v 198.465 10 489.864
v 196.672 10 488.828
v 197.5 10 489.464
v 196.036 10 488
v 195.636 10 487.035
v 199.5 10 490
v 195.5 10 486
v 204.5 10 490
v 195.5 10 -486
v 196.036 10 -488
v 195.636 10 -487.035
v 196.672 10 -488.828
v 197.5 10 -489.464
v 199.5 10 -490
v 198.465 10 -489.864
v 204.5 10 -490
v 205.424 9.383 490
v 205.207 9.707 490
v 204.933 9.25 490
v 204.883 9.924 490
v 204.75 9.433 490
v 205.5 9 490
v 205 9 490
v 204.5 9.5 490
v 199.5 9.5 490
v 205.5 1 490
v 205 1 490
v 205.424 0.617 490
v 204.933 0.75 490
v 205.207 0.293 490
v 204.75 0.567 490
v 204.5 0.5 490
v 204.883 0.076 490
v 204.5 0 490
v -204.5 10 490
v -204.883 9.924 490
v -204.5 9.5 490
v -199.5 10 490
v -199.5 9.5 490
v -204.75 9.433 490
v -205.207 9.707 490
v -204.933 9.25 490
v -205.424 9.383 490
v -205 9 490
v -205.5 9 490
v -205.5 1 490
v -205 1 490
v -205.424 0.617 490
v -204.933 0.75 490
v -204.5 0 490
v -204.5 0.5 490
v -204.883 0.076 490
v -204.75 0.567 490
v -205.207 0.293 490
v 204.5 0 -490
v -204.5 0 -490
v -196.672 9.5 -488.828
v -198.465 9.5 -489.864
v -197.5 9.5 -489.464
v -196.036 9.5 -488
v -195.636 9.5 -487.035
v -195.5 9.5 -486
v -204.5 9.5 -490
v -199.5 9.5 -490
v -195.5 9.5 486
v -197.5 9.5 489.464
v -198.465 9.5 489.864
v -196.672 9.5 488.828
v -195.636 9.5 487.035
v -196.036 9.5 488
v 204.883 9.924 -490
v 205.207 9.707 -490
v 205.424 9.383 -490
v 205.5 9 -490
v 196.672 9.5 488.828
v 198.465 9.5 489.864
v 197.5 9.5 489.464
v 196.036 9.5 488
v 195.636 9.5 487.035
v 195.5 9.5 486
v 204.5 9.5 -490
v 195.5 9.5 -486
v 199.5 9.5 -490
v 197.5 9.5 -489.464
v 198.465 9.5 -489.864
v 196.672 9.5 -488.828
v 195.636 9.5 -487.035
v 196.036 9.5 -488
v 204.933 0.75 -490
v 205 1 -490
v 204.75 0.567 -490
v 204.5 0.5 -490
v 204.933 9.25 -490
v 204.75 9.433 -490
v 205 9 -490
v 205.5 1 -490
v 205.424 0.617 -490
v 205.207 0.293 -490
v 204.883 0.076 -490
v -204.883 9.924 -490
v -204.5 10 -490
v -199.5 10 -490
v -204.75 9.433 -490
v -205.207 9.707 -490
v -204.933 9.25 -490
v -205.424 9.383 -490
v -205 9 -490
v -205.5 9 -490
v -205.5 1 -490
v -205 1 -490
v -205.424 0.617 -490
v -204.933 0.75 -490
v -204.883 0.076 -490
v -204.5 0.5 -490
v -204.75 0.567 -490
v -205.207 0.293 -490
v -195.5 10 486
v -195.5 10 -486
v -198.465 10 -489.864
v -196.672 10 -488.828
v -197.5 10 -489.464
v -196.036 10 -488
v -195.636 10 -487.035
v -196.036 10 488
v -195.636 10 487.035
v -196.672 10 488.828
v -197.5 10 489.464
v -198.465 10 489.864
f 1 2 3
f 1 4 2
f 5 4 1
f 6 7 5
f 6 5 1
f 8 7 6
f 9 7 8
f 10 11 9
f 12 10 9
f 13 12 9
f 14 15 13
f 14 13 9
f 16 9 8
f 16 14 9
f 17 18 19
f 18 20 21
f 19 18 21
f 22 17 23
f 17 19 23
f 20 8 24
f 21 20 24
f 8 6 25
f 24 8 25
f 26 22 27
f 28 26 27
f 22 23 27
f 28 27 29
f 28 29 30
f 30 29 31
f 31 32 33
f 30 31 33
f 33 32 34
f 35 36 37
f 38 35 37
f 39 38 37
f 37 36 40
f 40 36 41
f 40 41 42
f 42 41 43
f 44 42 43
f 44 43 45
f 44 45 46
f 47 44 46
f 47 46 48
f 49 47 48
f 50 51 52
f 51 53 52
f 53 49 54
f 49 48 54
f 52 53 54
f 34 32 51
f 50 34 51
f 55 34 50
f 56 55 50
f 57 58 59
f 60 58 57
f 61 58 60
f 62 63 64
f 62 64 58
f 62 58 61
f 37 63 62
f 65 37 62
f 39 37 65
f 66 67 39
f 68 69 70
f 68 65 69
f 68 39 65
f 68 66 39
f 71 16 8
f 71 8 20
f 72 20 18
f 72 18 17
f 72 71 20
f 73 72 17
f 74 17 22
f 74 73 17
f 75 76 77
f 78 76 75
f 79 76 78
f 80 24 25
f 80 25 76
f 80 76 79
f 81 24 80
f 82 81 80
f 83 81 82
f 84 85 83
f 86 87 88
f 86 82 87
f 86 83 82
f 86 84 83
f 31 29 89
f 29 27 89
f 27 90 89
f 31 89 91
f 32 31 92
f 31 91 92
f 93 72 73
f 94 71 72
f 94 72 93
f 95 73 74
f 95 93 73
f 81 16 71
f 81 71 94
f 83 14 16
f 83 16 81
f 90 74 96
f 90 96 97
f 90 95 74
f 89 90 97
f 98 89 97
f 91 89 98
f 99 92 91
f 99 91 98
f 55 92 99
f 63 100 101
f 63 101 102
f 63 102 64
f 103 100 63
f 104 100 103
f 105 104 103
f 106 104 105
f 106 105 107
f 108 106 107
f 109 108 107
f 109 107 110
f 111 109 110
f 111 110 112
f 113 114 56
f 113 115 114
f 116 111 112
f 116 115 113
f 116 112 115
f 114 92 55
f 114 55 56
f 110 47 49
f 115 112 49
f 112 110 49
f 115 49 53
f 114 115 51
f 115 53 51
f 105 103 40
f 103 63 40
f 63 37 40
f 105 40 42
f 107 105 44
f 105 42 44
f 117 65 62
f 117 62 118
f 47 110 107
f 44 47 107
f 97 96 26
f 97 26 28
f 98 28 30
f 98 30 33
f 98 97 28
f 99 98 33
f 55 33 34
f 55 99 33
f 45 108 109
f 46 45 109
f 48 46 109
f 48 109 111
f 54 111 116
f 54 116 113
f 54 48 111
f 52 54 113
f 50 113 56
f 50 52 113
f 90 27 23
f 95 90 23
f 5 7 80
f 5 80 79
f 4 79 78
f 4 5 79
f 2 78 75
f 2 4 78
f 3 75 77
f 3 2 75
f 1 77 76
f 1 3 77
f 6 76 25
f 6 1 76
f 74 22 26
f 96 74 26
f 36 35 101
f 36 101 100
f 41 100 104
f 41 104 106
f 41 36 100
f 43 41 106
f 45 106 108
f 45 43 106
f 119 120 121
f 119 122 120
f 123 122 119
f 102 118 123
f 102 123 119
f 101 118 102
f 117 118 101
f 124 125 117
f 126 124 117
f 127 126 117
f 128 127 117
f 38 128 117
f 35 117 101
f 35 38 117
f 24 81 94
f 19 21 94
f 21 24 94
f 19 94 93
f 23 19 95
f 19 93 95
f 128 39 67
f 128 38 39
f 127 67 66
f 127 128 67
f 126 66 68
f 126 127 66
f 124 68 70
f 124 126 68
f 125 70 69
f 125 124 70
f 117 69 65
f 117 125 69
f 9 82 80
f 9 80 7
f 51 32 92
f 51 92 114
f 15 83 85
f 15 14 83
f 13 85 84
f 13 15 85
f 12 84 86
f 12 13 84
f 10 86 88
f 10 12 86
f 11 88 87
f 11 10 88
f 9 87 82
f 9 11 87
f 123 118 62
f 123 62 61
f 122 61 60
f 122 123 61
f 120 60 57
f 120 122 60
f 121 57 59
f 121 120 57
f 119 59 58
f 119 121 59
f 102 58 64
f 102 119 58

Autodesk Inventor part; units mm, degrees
ref_plane "YZ Plane" through (0, 0, 0) normal (1, 0, 0) x (0, 1, 0)
ref_plane "XZ Plane" through (0, 0, 0) normal (0, 1, 0) x (-1, 0, 0)
ref_plane "XY Plane" through (0, 0, 0) normal (0, 0, 1) x (1, 0, 0)
sketch "Sketch6" plane through (0, 0, 0) normal (0, 1, 0) x (-1, 0, 0)
  line L0 (205.5, -490) -> (-205.5, -490)
  line L1 (-205.5, -490) -> (-205.5, 490)
  line L2 (-205.5, 490) -> (205.5, 490)
  line L3 (205.5, 490) -> (205.5, -490)
  line L4 (205.5, -490) -> (-205.5, 490) construction
  line L5 (-205.5, -490) -> (205.5, 490) construction
  point P0 (0, 0)
  dimension "d52" = 411
  dimension "d53" = 980
extrude "Plate2" add sketch "Sketch6" along normal blind 0.5
sketch "Sketch11" plane through (-205, 0, 490) normal (-1, 0, 0) x (0, -1, 0)
  line L0 (0, -980) -> (0, 0)
  line L1 (0, 0) -> (-10, 0)
  line L2 (-10, 0) -> (-10, -980)
  line L3 (-10, -980) -> (0, -980)
edge flange "Flange2" height 10 angle 90 thickness 0.5 bend radius 0.5 thickness toward (-1, 0, 0) relief tear relief width 0.5 relief depth 0.25 edges at (-205.5, 0.5, 0) wall of the first edge with corners at (-205, 0, -490) (-205, 0, 490) (-205, 10, 490) (-205, 10, -490)
bend "Bend3"
corner "Corner3"
sketch "Sketch12" plane through (-205.5, 9.5, 490) normal (0, 1, 0) x (-1, 0, 0)
  line L0 (0, -980) -> (0, 0)
  line L1 (0, 0) -> (-10, 0)
  line L2 (-10, 0) -> (-10, -980)
  line L3 (-10, -980) -> (0, -980)
edge flange "Flange3" height 10 angle 90 thickness 0.5 bend radius 0.5 thickness toward (0, 1, 0) relief tear relief width 0.5 relief depth 0.25 edges at (-205, 10, 0) wall of the first edge with corners at (-205.5, 9.5, -490) (-205.5, 9.5, 490) (-195.5, 9.5, 490) (-195.5, 9.5, -490)
bend "Bend4"
corner "Corner4"
sketch "Sketch13" plane through (205, 0, -490) normal (1, 0, 0) x (0, 1, 0)
  line L0 (0, 980) -> (0, 0)
  line L1 (0, 0) -> (10, 0)
  line L2 (10, 0) -> (10, 980)
  line L3 (10, 980) -> (0, 980)
edge flange "Flange4" height 10 angle 90 thickness 0.5 bend radius 0.5 thickness toward (1, 0, 0) relief tear relief width 0.5 relief depth 0.25 edges at (205.5, 0.5, 0) wall of the first edge with corners at (205, 0, 490) (205, 0, -490) (205, 10, -490) (205, 10, 490)
bend "Bend5"
corner "Corner5"
sketch "Sketch14" plane through (205.5, 9.5, -490) normal (0, 1, 0) x (-1, 0, 0)
  line L0 (0, 980) -> (0, 0)
  line L1 (0, 0) -> (10, 0)
  line L2 (10, 0) -> (10, 980)
  line L3 (10, 980) -> (0, 980)
edge flange "Flange5" height 10 angle 90 thickness 0.5 bend radius 0.5 thickness toward (0, 1, 0) relief tear relief width 0.5 relief depth 0.25 edges at (205, 10, 0) wall of the first edge with corners at (205.5, 9.5, 490) (205.5, 9.5, -490) (195.5, 9.5, -490) (195.5, 9.5, 490)
bend "Bend6"
corner "Corner6"
fillet "Corner Round1" radius 4 4 edges at (195.5, 9.75, -490) (-195.5, 9.75, -490) (-195.5, 9.75, 490) (195.5, 9.75, 490)
equation "\"d52\" = ЖАБРЫ_базовая_ширина - 5 * ЖАБРЫ_шаг_листов"
equation "\"d53\" = ЖАБРЫ_базовая_длина_кор_лист"
equation "\"d54\" = Thickness"
equation "\"d84\" = BendReliefWidth"
equation "\"d85\" = BendReliefDepth"
equation "\"d86\" = MinimumRemnant"
equation "\"d87\" = TransitionRadius"
equation "\"d90\" = BendRadius"
equation "\"d91\" = CornerReliefSize"
equation "\"d92\" = GapSize"
equation "\"d93\" = JacobiRadiusSize"
equation "\"d94\" = BendReliefWidth"
equation "\"d95\" = BendReliefDepth"
equation "\"d96\" = MinimumRemnant"
equation "\"d97\" = TransitionRadius"
equation "\"d100\" = BendRadius"
equation "\"d101\" = CornerReliefSize"
equation "\"d102\" = GapSize"
equation "\"d103\" = JacobiRadiusSize"
equation "\"d104\" = BendReliefWidth"
equation "\"d105\" = BendReliefDepth"
equation "\"d106\" = MinimumRemnant"
equation "\"d107\" = TransitionRadius"
equation "\"d110\" = BendRadius"
equation "\"d111\" = CornerReliefSize"
equation "\"d112\" = GapSize"
equation "\"d113\" = JacobiRadiusSize"
equation "\"d114\" = BendReliefWidth"
equation "\"d115\" = BendReliefDepth"
equation "\"d116\" = MinimumRemnant"
equation "\"d117\" = TransitionRadius"
equation "\"d120\" = BendRadius"
equation "\"d121\" = CornerReliefSize"
equation "\"d122\" = GapSize"
equation "\"d123\" = JacobiRadiusSize"
equation "\"BendRadius\" = Thickness"
equation "\"BendReliefWidth\" = Thickness"
equation "\"BendReliefDepth\" = 0.5 * Thickness"
equation "\"CornerReliefSize\" = 4 * Thickness"
equation "\"MinimumRemnant\" = 2 * Thickness"
equation "\"TransitionRadius\" = BendRadius"
equation "\"JacobiRadiusSize\" = BendRadius"
equation "\"GapSize\" = Thickness"
equation "\"ЖАБРЫ_базовая_ширина\" = 915"
equation "\"ЖАБРЫ_шаг_листов\" = 100.8"
equation "\"ЖАБРЫ_базовая_длина_кор_лист\" = 980"
equation "\"Thickness\" = 0.5"
properties part number "MSC 811 sheet gills" material "Stainless Steel"
